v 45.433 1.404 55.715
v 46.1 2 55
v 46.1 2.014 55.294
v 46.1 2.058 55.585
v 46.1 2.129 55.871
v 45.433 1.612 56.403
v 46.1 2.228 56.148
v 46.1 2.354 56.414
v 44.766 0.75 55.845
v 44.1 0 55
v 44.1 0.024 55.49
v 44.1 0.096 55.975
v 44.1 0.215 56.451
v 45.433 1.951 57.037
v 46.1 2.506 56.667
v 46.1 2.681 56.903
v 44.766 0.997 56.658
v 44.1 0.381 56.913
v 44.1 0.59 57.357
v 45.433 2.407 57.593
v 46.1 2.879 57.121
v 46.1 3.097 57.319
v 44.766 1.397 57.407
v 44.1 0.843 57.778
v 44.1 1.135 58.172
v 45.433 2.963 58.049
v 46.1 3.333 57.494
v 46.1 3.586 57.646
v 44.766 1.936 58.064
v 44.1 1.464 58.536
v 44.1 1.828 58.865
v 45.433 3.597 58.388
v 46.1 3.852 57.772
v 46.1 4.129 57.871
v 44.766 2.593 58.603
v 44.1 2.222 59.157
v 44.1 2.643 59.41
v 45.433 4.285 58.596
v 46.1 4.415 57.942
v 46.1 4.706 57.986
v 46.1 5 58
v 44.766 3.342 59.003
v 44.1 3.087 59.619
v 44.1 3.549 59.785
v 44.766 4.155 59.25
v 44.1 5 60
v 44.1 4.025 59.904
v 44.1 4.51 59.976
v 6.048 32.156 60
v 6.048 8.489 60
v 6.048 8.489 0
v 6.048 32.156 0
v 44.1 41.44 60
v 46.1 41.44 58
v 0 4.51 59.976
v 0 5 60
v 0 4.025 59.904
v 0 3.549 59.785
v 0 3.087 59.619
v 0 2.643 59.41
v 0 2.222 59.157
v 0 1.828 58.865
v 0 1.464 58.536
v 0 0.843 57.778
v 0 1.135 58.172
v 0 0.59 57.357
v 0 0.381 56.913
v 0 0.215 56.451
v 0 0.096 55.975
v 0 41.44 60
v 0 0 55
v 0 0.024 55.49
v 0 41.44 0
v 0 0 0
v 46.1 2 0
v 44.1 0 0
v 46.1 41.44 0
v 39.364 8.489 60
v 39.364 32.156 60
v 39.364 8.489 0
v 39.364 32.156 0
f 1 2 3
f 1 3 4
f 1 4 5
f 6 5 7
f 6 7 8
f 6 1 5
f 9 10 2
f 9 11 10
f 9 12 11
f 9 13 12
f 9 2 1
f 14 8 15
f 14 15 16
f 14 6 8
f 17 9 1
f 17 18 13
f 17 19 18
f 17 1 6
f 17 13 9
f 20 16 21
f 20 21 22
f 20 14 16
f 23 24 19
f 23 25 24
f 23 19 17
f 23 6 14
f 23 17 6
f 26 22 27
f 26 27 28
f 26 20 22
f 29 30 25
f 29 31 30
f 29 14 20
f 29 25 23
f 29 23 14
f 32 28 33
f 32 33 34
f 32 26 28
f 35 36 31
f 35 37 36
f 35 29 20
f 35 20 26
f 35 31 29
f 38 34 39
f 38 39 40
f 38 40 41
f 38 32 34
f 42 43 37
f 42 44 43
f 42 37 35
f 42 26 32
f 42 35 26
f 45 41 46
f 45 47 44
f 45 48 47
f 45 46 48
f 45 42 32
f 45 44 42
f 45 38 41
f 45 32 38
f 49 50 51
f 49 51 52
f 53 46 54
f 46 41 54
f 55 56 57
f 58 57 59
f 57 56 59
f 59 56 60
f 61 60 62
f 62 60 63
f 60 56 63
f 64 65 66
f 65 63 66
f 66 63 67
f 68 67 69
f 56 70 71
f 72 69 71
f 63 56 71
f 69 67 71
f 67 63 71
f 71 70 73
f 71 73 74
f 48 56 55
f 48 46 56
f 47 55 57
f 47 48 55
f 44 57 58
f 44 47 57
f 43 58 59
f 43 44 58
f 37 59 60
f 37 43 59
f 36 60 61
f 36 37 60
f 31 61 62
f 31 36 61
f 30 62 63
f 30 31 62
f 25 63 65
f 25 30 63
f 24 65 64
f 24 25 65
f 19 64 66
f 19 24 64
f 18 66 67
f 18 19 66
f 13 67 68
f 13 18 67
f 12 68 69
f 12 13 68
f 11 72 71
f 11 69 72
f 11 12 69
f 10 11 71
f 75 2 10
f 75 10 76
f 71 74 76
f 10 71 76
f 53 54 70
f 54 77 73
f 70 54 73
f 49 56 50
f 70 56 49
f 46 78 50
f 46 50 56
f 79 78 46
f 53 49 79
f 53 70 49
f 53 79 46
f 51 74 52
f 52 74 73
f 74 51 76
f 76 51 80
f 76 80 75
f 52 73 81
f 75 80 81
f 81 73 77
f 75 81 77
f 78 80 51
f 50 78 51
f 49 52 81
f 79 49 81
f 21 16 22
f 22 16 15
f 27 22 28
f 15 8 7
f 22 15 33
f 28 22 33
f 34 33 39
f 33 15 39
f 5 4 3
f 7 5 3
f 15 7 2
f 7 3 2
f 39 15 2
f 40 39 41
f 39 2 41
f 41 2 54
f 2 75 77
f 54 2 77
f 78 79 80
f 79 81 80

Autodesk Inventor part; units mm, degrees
ref_plane "YZ Plane" through (0, 0, 0) normal (1, 0, 0) x (0, 1, 0)
ref_plane "XZ Plane" through (0, 0, 0) normal (0, 1, 0) x (-1, 0, 0)
ref_plane "XY Plane" through (0, 0, 0) normal (0, 0, 1) x (1, 0, 0)
sketch "Sketch1" plane through (0, 0, 0) normal (0, 0, 1) x (1, 0, 0)
  line L0 (0, 0) -> (46.0996, 0)
  line L1 (46.0996, 0) -> (46.0996, 41.4402)
  line L2 (46.0996, 41.4402) -> (0, 41.4402)
  line L3 (0, 41.4402) -> (0, 0)
  line L4 (6.0482, 32.1555) -> (39.3637, 32.1555)
  line L5 (39.3637, 32.1555) -> (39.3637, 8.4888)
  line L6 (39.3637, 8.4888) -> (6.0482, 8.4888)
  line L7 (6.0482, 8.4888) -> (6.0482, 32.1555)
extrude "Extrusion1" add sketch "Sketch1" along normal blind 60
fillet "Fillet1" radius 5 1 edges at (23.0498, 0, 60)
chamfer "Chamfer1" distance 2 angle 45 3 edges at (46.0996, 23.2201, 60) (46.0996, 1.4645, 58.5355) (46.0996, 0, 27.5)
properties material "Steel, Alloy"
